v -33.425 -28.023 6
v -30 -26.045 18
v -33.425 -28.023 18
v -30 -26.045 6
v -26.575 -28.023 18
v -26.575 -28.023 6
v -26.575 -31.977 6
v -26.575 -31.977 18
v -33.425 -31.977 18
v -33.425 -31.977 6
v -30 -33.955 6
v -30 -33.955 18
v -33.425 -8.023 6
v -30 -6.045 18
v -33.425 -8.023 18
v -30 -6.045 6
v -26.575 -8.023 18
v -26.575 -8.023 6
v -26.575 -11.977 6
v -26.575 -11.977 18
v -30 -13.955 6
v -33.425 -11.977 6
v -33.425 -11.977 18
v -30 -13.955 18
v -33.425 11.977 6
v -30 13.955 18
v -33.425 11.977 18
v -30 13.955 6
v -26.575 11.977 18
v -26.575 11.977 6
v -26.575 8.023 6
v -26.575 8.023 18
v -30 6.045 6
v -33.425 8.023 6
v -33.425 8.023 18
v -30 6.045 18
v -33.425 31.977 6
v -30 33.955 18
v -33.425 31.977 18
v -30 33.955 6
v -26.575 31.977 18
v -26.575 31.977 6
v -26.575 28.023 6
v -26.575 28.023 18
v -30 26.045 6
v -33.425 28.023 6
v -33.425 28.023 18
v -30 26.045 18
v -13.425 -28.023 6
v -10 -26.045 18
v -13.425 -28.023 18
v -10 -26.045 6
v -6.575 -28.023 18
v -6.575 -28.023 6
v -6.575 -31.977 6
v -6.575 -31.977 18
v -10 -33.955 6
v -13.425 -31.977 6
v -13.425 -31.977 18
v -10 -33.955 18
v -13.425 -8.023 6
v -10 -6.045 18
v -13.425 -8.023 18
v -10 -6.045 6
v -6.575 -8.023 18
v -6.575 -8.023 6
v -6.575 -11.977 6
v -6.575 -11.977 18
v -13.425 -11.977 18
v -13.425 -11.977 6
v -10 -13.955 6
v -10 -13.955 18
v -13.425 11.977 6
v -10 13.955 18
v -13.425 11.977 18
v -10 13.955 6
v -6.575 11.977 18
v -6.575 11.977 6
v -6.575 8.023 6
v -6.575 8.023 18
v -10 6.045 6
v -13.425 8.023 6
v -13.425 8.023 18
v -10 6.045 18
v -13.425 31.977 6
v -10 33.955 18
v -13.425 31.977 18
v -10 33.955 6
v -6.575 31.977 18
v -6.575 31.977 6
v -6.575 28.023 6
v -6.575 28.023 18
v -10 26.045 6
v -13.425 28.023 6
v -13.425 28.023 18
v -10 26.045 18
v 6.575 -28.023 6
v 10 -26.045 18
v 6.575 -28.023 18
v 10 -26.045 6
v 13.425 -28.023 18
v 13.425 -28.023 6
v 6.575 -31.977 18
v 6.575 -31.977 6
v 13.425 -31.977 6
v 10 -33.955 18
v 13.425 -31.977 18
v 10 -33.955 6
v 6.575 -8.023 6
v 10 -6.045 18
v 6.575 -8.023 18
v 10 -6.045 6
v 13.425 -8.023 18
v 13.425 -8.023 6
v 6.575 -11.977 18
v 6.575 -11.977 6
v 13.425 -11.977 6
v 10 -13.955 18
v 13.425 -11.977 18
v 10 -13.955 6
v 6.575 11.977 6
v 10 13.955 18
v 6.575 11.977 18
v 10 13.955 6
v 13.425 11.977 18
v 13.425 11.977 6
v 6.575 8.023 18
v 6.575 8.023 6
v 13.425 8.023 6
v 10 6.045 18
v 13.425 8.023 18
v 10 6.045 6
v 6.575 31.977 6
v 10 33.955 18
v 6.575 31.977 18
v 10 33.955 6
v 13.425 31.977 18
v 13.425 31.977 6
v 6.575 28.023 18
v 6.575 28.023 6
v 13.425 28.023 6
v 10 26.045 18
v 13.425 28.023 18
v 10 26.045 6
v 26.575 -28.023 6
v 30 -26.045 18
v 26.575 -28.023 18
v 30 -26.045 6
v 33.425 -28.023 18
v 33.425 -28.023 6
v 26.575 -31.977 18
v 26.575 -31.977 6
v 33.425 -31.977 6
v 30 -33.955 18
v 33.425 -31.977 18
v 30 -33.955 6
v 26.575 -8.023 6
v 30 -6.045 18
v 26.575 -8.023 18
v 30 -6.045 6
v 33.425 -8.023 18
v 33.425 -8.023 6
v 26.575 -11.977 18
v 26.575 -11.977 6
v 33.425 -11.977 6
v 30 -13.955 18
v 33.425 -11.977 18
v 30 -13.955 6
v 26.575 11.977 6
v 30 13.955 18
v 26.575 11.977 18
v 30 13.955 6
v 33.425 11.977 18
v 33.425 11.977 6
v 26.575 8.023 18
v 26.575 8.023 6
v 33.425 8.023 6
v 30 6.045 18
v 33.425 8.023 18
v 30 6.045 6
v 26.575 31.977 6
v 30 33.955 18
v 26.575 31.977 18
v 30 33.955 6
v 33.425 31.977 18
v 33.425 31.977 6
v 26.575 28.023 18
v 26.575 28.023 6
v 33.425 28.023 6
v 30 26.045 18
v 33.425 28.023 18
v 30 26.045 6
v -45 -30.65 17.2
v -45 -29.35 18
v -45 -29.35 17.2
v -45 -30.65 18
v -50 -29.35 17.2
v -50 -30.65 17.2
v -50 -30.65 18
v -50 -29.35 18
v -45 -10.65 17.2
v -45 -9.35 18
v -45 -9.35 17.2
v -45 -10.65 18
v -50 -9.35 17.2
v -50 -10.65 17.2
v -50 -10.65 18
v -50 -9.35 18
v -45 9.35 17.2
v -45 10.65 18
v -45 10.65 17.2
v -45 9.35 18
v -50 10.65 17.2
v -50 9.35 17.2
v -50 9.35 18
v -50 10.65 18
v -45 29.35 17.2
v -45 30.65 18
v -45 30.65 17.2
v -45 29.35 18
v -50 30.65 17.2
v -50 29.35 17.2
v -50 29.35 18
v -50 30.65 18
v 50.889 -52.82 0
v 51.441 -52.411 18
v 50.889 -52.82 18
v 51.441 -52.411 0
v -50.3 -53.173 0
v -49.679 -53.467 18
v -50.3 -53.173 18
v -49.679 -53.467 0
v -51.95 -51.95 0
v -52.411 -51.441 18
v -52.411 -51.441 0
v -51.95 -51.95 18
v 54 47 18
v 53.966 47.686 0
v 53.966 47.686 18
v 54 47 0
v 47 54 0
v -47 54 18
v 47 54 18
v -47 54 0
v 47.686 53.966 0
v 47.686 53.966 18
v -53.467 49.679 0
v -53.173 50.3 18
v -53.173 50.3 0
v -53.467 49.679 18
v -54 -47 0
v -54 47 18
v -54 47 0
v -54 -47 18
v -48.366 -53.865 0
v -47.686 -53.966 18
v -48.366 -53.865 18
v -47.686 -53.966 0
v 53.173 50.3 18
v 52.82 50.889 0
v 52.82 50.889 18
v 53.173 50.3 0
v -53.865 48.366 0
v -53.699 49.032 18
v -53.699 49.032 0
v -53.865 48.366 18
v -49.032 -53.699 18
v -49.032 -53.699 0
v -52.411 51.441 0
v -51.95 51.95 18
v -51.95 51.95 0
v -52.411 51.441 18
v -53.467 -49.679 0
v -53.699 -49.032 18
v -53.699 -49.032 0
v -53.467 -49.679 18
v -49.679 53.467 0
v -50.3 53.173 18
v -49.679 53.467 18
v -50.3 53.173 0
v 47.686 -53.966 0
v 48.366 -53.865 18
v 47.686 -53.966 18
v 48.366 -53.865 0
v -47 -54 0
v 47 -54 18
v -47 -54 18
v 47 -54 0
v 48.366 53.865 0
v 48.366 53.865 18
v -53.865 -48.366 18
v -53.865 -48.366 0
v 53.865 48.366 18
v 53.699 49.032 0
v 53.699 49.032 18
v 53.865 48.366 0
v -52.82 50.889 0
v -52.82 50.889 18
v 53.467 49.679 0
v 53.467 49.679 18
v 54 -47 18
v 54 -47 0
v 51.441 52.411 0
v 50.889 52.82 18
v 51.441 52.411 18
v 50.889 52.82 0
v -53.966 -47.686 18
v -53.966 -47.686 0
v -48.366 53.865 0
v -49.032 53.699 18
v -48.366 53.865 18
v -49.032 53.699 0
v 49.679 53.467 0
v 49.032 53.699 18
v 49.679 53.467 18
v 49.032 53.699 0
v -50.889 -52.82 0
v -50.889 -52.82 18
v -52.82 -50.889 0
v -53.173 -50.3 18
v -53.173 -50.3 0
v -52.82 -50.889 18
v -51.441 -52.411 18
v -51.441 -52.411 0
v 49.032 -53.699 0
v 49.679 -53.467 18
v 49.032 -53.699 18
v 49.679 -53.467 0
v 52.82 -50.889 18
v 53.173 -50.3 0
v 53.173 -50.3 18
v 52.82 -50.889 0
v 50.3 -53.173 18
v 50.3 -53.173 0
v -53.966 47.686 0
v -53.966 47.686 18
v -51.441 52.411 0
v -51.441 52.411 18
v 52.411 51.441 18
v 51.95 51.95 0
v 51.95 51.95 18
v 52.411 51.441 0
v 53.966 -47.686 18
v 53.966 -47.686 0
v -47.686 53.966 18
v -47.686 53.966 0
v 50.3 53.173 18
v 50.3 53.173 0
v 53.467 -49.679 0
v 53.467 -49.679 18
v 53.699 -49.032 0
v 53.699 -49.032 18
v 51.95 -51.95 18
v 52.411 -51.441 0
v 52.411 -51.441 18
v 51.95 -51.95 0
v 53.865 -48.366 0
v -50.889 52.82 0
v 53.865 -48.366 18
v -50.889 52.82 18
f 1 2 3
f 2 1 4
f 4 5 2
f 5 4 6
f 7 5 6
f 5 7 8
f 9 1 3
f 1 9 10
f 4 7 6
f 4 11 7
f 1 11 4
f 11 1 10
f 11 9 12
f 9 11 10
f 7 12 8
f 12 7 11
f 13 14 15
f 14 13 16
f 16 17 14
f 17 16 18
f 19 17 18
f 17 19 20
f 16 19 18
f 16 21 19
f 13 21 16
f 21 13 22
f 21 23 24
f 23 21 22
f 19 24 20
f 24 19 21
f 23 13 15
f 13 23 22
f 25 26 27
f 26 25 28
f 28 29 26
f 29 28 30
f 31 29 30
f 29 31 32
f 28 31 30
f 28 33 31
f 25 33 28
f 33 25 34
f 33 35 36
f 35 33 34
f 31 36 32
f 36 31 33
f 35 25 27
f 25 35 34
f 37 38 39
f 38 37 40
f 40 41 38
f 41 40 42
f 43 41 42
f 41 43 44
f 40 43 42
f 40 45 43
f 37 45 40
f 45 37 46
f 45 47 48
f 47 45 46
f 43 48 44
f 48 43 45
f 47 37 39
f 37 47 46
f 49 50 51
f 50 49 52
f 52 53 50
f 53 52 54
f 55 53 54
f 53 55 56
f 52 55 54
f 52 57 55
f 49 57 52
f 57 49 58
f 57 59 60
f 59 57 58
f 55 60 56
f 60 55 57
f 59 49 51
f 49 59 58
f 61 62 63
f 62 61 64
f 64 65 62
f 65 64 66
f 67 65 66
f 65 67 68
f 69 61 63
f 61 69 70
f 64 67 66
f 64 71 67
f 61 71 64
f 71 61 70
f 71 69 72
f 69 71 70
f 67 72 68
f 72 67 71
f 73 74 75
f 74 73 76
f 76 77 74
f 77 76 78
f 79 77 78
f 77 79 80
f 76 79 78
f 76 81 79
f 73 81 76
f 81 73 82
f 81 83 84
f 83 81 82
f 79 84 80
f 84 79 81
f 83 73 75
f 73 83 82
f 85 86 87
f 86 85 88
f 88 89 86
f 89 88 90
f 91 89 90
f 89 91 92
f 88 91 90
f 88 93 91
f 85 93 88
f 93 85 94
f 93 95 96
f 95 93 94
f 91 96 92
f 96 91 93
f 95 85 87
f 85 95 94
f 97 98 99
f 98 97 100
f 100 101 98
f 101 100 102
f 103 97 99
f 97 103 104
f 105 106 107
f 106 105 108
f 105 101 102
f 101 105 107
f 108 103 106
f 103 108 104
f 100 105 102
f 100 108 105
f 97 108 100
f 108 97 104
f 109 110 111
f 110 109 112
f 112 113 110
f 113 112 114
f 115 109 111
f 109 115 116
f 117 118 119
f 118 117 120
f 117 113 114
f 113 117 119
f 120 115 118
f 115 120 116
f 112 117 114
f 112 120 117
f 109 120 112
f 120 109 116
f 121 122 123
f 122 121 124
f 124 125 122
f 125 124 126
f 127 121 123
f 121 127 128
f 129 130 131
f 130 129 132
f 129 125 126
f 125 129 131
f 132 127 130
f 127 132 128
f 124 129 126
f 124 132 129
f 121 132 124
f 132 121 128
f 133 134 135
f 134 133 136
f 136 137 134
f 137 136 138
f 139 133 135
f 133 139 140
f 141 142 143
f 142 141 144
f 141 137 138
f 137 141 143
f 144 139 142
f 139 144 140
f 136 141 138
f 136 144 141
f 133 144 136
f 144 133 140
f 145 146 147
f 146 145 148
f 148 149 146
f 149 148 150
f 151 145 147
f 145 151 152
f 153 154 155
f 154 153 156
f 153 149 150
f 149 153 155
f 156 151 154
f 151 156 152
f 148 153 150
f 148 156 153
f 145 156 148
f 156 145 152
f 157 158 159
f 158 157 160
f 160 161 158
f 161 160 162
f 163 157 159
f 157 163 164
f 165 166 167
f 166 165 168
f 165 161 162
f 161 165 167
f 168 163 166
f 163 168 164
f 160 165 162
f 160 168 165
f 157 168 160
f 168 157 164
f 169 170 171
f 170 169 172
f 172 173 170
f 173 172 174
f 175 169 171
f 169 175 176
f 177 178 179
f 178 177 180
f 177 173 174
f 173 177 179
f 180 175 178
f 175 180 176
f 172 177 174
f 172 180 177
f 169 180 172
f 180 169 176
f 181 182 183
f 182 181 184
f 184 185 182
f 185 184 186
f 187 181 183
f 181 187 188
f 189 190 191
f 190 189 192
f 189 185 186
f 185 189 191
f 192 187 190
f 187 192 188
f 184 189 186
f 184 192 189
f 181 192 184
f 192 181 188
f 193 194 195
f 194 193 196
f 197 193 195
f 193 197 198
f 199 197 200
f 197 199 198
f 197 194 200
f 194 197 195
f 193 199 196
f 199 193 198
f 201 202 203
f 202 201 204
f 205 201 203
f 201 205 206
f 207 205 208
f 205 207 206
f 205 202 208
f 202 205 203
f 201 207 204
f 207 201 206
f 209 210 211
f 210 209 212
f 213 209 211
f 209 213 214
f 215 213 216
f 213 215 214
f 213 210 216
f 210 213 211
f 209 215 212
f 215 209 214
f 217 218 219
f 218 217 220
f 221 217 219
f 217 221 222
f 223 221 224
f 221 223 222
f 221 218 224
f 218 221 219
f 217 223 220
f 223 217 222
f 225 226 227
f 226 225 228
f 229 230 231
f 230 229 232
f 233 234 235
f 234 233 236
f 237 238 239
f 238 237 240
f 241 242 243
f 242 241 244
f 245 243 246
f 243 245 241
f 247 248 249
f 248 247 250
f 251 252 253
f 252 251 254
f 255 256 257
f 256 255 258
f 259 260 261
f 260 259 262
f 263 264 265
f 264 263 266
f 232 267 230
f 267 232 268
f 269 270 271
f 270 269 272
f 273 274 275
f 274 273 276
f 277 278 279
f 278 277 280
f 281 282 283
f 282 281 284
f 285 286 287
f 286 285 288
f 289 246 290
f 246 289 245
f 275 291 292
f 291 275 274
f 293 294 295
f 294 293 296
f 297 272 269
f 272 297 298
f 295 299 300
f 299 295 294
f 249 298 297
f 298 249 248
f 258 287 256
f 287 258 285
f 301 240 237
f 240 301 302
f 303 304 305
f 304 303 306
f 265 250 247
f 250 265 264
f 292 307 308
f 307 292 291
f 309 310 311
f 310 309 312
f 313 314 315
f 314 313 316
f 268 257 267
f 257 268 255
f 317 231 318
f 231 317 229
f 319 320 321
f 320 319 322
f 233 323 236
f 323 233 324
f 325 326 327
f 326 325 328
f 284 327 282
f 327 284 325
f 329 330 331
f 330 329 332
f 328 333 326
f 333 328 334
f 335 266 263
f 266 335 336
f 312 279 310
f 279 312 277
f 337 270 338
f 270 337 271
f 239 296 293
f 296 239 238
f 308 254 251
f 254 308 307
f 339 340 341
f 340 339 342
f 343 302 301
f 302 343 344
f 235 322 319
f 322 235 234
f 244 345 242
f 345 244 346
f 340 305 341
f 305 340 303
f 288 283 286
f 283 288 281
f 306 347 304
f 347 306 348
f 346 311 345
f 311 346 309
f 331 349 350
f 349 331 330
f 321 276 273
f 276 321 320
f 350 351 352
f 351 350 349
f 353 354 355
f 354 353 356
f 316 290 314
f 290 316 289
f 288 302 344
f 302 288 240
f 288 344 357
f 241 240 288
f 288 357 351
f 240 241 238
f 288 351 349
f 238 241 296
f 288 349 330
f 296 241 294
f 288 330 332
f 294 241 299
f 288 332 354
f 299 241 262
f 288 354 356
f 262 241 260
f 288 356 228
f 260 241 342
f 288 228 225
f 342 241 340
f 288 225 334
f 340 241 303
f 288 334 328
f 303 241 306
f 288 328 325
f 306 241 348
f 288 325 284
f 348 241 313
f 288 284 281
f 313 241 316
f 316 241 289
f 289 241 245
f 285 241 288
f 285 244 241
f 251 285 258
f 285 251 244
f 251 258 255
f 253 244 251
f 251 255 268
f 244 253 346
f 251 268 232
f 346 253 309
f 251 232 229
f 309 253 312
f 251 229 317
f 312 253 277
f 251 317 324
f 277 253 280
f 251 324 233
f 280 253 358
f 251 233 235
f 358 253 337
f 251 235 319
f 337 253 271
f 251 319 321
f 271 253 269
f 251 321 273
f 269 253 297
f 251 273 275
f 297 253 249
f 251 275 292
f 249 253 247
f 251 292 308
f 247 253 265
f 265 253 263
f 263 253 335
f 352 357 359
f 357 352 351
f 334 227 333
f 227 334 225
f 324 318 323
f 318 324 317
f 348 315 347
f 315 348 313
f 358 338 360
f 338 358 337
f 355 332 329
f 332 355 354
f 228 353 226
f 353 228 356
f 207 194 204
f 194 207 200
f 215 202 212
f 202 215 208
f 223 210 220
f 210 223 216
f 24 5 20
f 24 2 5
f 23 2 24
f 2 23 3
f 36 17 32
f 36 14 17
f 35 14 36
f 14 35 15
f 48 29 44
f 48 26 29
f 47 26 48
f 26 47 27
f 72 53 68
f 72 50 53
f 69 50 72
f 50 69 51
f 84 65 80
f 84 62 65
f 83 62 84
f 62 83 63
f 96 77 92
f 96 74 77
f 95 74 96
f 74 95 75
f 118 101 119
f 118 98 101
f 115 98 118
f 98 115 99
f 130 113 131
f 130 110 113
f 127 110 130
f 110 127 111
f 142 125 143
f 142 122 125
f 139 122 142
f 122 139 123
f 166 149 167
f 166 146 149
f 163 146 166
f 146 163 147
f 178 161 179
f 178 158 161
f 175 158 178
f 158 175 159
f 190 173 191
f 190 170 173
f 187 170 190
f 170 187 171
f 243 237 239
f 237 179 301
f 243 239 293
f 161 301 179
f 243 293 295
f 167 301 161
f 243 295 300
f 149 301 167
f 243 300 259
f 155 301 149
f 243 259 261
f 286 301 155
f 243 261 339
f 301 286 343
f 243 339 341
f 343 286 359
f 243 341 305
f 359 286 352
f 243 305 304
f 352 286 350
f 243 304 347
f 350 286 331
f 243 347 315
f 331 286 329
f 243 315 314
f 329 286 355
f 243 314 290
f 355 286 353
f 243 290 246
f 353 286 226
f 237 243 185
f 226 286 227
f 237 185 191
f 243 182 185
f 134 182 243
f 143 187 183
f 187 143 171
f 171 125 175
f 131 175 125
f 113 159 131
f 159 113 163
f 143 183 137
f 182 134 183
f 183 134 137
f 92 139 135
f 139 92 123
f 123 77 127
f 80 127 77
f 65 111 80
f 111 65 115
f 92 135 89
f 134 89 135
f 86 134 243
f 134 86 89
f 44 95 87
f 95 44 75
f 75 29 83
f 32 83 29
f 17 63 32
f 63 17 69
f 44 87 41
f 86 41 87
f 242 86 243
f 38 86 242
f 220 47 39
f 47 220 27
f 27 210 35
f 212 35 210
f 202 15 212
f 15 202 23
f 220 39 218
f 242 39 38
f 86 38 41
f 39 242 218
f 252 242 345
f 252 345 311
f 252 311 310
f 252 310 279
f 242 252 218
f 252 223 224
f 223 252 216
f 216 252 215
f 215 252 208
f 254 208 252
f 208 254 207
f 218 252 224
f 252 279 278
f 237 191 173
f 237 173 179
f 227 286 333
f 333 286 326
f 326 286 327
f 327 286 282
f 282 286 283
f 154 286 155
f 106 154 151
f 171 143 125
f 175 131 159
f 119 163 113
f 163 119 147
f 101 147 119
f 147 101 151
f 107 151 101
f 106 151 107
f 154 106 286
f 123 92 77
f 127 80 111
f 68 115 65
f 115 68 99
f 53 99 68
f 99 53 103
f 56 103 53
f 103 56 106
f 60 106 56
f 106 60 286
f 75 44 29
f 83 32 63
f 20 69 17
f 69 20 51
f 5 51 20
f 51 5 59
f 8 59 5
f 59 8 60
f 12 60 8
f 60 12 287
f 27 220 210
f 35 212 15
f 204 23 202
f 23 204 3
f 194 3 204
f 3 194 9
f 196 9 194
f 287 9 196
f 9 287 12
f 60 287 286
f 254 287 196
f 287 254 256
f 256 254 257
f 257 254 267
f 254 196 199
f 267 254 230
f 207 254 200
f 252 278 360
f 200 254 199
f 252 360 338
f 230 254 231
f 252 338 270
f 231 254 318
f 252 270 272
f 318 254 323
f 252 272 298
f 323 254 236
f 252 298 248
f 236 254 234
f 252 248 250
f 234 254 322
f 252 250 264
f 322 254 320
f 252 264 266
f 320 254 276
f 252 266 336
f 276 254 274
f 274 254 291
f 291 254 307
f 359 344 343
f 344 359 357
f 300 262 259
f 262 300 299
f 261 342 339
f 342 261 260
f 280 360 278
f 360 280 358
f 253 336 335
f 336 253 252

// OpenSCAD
// V1.4.2 · Parametric FDM 1/4-inch driver-bit rack, mm/Z-up.
// This is a NEW CAD candidate distinct from the visual Three.js scene model.
// The nominal 6.35 mm size does not prove socket fit; print the coupon first.
// Author: 3D Worlds, MIT. No tool-load rating and no physical test on record.
$fn = 64;
mode = "body";                 // "body" or "coupon"
columns = 4;
rows = 4;
pitch_mm = 20;
base_width_mm = 108;
base_depth_mm = 108;
base_height_mm = 18;
corner_radius_mm = 7;
pocket_depth_mm = 12;
bit_across_flats_mm = 6.35;   // 1/4-inch nominal, real bit measurement required
socket_clearance_per_side_mm = 0.25; // nominal, not calibrated
floor_mm = base_height_mm - pocket_depth_mm;
assert(columns == 4 && rows == 4, "4x4 index layout required");
assert(pitch_mm > 2 * (bit_across_flats_mm + socket_clearance_per_side_mm),
       "socket pitch too small");
assert(floor_mm >= 3.5, "pocket floor below design minimum");
assert(base_width_mm > (columns - 1) * pitch_mm + 18 &&
       base_depth_mm > (rows - 1) * pitch_mm + 18,
       "insufficient edge margin");
assert(socket_clearance_per_side_mm >= 0 &&
       socket_clearance_per_side_mm <= 0.7,
       "uncalibrated clearance out of proposed bounds");

module rounded_base(w, d, h, r) {
  hull() {
    for (x = [-w/2 + r, w/2 - r])
      for (y = [-d/2 + r, d/2 - r])
        translate([x, y, 0]) cylinder(h = h, r = r);
  }
}

module hex_socket(af, h) {
  // Regular hexagon R = across-flats / sqrt(3), rotate for flat side.
  rotate([0,0,30]) cylinder(h = h, r = af / sqrt(3), $fn = 6);
}

module body() {
  difference() {
    rounded_base(base_width_mm, base_depth_mm,
                 base_height_mm, corner_radius_mm);
    for (i = [0:columns-1]) for (j = [0:rows-1]) {
      x = (i - (columns - 1)/2) * pitch_mm;
      y = (j - (rows - 1)/2) * pitch_mm;
      translate([x,y,base_height_mm-pocket_depth_mm])
        hex_socket(bit_across_flats_mm +
                   2 * socket_clearance_per_side_mm,
                   pocket_depth_mm + 1);
    }
    // Simple row markers: noncritical surface grooves outside sockets.
    for (j = [0:rows-1]) {
      y = (j - (rows-1)/2) * pitch_mm;
      translate([-base_width_mm/2 + 4, y - 0.65, base_height_mm - 0.8])
        cube([5,1.3,1.2]);
    }
  }
}

// Three 3.5mm-deep calibration pockets to compare measured 1/4-in bit
// fit at 0.15, 0.25, and 0.40 mm clearance PER SIDE on a given machine.
module coupon() {
  plate_w = 69;
  union() {
    translate([-plate_w/2,-12,0]) cube([plate_w,24,3]);
    for (i=[0:2]) {
      difference() {
        translate([(i-1)*22-8,-8,2.9])
          cube([16,16,7]);
        translate([(i-1)*22,0,5])
          hex_socket(bit_across_flats_mm +
                     2 * ([0.15,0.25,0.40][i]),5.5);
      }
    }
  }
}
if (mode == "coupon") coupon(); else body();
